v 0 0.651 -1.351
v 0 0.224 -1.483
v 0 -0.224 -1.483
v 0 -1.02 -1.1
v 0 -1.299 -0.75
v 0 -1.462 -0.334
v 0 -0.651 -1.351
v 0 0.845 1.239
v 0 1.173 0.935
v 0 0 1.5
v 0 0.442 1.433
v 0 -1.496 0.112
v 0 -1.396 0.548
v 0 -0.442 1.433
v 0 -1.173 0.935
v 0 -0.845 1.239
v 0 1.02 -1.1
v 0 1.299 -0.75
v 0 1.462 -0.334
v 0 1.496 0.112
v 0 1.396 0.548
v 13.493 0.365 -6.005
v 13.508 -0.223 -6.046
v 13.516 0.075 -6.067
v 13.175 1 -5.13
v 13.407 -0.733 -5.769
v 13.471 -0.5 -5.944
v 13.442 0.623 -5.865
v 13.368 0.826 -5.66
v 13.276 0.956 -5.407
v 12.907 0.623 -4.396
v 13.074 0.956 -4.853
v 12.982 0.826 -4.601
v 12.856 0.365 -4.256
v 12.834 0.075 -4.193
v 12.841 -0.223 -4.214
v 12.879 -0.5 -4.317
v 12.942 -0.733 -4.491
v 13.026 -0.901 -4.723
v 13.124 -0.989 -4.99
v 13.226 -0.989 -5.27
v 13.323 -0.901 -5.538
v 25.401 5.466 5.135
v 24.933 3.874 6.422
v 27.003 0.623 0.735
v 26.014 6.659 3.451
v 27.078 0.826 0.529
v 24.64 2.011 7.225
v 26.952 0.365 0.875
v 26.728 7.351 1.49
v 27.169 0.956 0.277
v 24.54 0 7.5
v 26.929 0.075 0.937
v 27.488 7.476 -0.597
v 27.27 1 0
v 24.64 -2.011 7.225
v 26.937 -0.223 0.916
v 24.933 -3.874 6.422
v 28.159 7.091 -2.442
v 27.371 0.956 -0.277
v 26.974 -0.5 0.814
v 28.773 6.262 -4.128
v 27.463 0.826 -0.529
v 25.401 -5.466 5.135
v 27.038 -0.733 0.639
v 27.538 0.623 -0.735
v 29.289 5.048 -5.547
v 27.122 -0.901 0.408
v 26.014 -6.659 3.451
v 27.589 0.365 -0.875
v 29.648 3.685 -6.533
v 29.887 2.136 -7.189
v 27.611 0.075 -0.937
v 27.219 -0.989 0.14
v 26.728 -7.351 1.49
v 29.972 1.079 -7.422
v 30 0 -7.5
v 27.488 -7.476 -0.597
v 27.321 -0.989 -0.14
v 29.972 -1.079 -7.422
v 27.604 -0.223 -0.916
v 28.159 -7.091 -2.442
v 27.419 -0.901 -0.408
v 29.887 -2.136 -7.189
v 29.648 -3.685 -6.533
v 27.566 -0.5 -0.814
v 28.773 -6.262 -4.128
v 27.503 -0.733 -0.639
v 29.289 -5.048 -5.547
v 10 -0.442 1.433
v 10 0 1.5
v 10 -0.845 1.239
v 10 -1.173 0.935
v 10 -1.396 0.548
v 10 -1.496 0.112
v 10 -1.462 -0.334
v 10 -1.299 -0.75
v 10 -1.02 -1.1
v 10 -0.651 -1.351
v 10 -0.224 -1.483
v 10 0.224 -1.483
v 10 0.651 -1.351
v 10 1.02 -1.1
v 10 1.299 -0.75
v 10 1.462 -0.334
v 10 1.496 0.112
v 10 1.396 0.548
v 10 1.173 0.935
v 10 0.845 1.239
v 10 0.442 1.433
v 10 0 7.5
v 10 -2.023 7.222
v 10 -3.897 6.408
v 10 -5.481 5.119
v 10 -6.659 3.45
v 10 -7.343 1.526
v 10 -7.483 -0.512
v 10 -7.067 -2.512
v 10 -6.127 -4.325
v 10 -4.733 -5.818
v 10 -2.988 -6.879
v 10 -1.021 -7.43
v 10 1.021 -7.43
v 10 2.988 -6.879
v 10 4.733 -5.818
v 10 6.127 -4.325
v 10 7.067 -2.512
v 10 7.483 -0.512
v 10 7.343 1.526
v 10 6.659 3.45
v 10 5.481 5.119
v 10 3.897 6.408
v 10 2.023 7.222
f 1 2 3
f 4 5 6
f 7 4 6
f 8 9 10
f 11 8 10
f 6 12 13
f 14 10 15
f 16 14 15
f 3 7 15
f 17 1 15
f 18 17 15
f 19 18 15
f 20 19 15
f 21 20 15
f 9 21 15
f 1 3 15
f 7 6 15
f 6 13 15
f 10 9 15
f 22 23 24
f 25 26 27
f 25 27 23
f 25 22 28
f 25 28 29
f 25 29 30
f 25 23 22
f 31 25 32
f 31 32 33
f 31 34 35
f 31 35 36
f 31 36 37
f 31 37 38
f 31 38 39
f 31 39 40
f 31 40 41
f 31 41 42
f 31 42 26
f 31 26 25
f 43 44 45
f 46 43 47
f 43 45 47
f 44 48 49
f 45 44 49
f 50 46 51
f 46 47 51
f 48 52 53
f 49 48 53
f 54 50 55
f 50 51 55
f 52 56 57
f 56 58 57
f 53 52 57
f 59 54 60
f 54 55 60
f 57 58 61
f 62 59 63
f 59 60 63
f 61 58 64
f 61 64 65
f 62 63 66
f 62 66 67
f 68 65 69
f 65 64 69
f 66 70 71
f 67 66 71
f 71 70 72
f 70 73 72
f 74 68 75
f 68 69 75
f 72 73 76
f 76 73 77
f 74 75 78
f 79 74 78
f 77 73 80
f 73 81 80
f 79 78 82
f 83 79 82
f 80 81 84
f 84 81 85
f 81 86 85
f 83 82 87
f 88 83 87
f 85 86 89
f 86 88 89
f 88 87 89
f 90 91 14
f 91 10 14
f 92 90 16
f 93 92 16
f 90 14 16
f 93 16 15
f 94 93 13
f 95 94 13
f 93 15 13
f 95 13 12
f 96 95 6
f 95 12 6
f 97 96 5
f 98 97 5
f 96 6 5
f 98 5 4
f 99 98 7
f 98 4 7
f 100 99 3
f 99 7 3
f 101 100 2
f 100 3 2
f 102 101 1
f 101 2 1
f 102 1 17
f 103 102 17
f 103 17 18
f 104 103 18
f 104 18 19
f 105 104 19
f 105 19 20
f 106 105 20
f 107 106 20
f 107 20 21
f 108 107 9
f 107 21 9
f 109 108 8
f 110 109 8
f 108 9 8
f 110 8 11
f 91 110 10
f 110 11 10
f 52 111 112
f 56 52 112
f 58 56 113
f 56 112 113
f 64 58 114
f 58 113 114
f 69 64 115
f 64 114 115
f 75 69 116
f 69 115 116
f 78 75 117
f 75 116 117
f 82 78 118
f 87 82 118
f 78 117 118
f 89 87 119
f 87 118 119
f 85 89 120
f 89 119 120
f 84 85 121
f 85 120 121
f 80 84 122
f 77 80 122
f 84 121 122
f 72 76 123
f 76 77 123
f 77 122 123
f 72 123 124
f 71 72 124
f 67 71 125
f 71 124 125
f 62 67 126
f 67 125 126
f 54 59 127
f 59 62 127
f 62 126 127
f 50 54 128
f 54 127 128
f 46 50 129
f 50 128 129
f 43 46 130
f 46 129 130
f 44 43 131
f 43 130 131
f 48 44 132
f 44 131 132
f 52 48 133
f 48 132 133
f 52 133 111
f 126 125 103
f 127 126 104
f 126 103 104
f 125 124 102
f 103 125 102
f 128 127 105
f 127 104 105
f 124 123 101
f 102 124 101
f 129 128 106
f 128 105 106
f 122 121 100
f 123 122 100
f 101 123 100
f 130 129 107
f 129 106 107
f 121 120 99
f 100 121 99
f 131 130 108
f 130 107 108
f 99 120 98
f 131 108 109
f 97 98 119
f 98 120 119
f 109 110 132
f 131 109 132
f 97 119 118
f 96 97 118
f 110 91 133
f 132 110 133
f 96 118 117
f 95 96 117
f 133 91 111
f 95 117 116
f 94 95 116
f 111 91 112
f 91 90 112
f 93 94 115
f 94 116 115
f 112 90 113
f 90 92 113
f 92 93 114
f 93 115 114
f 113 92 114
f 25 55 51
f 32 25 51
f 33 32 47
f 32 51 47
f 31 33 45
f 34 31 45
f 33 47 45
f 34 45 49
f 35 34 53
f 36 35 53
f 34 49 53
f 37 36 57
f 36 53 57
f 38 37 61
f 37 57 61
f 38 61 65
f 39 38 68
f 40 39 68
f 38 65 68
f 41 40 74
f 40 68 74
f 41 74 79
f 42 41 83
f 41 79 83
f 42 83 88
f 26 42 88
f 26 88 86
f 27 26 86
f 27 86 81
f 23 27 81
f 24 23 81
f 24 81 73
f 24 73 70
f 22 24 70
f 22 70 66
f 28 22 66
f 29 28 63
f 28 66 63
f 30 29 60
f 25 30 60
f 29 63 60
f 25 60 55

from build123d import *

# Parameters (mm, degrees)
F3_DEPTH      = 7.501
F3_DEPTH_BACK = 7.501
F4_R          = 1
F5_DEPTH      = 15


with BuildPart() as f1:
    # F0 (on Front) → F1 (revolve)
    with BuildSketch(Plane.XZ):
        Polygon((30, 7.5), (10, 7.5), (10, 1.5), (0, 1.5), (0, 0), (30, 0), align=None)
    revolve(axis=Axis((8.7773360142, 0, 0), (1, 0, 0)))

    # F2 (on Front) → F3 (cut, two sides)
    with BuildSketch(Plane.XZ) as f3_sk:
        Polygon((24.540446486, 7.5), (30, -7.5), (30, 7.5), align=None)
    extrude(amount=-F3_DEPTH, mode=Mode.SUBTRACT)
    extrude(f3_sk.sketch, amount=F3_DEPTH_BACK, mode=Mode.SUBTRACT)

    # F4 (on face) → F5 (cut)
    with BuildSketch(Plane(origin=(24.0802131105, 0, 8.764480807), x_dir=(0, 1, 0), z_dir=(0.9396926208, 0, 0.3420201433))):
        with Locations((0, -9.3269656621)):
            Circle(F4_R)
    extrude(amount=-F5_DEPTH, mode=Mode.SUBTRACT)


solid = f1.part
